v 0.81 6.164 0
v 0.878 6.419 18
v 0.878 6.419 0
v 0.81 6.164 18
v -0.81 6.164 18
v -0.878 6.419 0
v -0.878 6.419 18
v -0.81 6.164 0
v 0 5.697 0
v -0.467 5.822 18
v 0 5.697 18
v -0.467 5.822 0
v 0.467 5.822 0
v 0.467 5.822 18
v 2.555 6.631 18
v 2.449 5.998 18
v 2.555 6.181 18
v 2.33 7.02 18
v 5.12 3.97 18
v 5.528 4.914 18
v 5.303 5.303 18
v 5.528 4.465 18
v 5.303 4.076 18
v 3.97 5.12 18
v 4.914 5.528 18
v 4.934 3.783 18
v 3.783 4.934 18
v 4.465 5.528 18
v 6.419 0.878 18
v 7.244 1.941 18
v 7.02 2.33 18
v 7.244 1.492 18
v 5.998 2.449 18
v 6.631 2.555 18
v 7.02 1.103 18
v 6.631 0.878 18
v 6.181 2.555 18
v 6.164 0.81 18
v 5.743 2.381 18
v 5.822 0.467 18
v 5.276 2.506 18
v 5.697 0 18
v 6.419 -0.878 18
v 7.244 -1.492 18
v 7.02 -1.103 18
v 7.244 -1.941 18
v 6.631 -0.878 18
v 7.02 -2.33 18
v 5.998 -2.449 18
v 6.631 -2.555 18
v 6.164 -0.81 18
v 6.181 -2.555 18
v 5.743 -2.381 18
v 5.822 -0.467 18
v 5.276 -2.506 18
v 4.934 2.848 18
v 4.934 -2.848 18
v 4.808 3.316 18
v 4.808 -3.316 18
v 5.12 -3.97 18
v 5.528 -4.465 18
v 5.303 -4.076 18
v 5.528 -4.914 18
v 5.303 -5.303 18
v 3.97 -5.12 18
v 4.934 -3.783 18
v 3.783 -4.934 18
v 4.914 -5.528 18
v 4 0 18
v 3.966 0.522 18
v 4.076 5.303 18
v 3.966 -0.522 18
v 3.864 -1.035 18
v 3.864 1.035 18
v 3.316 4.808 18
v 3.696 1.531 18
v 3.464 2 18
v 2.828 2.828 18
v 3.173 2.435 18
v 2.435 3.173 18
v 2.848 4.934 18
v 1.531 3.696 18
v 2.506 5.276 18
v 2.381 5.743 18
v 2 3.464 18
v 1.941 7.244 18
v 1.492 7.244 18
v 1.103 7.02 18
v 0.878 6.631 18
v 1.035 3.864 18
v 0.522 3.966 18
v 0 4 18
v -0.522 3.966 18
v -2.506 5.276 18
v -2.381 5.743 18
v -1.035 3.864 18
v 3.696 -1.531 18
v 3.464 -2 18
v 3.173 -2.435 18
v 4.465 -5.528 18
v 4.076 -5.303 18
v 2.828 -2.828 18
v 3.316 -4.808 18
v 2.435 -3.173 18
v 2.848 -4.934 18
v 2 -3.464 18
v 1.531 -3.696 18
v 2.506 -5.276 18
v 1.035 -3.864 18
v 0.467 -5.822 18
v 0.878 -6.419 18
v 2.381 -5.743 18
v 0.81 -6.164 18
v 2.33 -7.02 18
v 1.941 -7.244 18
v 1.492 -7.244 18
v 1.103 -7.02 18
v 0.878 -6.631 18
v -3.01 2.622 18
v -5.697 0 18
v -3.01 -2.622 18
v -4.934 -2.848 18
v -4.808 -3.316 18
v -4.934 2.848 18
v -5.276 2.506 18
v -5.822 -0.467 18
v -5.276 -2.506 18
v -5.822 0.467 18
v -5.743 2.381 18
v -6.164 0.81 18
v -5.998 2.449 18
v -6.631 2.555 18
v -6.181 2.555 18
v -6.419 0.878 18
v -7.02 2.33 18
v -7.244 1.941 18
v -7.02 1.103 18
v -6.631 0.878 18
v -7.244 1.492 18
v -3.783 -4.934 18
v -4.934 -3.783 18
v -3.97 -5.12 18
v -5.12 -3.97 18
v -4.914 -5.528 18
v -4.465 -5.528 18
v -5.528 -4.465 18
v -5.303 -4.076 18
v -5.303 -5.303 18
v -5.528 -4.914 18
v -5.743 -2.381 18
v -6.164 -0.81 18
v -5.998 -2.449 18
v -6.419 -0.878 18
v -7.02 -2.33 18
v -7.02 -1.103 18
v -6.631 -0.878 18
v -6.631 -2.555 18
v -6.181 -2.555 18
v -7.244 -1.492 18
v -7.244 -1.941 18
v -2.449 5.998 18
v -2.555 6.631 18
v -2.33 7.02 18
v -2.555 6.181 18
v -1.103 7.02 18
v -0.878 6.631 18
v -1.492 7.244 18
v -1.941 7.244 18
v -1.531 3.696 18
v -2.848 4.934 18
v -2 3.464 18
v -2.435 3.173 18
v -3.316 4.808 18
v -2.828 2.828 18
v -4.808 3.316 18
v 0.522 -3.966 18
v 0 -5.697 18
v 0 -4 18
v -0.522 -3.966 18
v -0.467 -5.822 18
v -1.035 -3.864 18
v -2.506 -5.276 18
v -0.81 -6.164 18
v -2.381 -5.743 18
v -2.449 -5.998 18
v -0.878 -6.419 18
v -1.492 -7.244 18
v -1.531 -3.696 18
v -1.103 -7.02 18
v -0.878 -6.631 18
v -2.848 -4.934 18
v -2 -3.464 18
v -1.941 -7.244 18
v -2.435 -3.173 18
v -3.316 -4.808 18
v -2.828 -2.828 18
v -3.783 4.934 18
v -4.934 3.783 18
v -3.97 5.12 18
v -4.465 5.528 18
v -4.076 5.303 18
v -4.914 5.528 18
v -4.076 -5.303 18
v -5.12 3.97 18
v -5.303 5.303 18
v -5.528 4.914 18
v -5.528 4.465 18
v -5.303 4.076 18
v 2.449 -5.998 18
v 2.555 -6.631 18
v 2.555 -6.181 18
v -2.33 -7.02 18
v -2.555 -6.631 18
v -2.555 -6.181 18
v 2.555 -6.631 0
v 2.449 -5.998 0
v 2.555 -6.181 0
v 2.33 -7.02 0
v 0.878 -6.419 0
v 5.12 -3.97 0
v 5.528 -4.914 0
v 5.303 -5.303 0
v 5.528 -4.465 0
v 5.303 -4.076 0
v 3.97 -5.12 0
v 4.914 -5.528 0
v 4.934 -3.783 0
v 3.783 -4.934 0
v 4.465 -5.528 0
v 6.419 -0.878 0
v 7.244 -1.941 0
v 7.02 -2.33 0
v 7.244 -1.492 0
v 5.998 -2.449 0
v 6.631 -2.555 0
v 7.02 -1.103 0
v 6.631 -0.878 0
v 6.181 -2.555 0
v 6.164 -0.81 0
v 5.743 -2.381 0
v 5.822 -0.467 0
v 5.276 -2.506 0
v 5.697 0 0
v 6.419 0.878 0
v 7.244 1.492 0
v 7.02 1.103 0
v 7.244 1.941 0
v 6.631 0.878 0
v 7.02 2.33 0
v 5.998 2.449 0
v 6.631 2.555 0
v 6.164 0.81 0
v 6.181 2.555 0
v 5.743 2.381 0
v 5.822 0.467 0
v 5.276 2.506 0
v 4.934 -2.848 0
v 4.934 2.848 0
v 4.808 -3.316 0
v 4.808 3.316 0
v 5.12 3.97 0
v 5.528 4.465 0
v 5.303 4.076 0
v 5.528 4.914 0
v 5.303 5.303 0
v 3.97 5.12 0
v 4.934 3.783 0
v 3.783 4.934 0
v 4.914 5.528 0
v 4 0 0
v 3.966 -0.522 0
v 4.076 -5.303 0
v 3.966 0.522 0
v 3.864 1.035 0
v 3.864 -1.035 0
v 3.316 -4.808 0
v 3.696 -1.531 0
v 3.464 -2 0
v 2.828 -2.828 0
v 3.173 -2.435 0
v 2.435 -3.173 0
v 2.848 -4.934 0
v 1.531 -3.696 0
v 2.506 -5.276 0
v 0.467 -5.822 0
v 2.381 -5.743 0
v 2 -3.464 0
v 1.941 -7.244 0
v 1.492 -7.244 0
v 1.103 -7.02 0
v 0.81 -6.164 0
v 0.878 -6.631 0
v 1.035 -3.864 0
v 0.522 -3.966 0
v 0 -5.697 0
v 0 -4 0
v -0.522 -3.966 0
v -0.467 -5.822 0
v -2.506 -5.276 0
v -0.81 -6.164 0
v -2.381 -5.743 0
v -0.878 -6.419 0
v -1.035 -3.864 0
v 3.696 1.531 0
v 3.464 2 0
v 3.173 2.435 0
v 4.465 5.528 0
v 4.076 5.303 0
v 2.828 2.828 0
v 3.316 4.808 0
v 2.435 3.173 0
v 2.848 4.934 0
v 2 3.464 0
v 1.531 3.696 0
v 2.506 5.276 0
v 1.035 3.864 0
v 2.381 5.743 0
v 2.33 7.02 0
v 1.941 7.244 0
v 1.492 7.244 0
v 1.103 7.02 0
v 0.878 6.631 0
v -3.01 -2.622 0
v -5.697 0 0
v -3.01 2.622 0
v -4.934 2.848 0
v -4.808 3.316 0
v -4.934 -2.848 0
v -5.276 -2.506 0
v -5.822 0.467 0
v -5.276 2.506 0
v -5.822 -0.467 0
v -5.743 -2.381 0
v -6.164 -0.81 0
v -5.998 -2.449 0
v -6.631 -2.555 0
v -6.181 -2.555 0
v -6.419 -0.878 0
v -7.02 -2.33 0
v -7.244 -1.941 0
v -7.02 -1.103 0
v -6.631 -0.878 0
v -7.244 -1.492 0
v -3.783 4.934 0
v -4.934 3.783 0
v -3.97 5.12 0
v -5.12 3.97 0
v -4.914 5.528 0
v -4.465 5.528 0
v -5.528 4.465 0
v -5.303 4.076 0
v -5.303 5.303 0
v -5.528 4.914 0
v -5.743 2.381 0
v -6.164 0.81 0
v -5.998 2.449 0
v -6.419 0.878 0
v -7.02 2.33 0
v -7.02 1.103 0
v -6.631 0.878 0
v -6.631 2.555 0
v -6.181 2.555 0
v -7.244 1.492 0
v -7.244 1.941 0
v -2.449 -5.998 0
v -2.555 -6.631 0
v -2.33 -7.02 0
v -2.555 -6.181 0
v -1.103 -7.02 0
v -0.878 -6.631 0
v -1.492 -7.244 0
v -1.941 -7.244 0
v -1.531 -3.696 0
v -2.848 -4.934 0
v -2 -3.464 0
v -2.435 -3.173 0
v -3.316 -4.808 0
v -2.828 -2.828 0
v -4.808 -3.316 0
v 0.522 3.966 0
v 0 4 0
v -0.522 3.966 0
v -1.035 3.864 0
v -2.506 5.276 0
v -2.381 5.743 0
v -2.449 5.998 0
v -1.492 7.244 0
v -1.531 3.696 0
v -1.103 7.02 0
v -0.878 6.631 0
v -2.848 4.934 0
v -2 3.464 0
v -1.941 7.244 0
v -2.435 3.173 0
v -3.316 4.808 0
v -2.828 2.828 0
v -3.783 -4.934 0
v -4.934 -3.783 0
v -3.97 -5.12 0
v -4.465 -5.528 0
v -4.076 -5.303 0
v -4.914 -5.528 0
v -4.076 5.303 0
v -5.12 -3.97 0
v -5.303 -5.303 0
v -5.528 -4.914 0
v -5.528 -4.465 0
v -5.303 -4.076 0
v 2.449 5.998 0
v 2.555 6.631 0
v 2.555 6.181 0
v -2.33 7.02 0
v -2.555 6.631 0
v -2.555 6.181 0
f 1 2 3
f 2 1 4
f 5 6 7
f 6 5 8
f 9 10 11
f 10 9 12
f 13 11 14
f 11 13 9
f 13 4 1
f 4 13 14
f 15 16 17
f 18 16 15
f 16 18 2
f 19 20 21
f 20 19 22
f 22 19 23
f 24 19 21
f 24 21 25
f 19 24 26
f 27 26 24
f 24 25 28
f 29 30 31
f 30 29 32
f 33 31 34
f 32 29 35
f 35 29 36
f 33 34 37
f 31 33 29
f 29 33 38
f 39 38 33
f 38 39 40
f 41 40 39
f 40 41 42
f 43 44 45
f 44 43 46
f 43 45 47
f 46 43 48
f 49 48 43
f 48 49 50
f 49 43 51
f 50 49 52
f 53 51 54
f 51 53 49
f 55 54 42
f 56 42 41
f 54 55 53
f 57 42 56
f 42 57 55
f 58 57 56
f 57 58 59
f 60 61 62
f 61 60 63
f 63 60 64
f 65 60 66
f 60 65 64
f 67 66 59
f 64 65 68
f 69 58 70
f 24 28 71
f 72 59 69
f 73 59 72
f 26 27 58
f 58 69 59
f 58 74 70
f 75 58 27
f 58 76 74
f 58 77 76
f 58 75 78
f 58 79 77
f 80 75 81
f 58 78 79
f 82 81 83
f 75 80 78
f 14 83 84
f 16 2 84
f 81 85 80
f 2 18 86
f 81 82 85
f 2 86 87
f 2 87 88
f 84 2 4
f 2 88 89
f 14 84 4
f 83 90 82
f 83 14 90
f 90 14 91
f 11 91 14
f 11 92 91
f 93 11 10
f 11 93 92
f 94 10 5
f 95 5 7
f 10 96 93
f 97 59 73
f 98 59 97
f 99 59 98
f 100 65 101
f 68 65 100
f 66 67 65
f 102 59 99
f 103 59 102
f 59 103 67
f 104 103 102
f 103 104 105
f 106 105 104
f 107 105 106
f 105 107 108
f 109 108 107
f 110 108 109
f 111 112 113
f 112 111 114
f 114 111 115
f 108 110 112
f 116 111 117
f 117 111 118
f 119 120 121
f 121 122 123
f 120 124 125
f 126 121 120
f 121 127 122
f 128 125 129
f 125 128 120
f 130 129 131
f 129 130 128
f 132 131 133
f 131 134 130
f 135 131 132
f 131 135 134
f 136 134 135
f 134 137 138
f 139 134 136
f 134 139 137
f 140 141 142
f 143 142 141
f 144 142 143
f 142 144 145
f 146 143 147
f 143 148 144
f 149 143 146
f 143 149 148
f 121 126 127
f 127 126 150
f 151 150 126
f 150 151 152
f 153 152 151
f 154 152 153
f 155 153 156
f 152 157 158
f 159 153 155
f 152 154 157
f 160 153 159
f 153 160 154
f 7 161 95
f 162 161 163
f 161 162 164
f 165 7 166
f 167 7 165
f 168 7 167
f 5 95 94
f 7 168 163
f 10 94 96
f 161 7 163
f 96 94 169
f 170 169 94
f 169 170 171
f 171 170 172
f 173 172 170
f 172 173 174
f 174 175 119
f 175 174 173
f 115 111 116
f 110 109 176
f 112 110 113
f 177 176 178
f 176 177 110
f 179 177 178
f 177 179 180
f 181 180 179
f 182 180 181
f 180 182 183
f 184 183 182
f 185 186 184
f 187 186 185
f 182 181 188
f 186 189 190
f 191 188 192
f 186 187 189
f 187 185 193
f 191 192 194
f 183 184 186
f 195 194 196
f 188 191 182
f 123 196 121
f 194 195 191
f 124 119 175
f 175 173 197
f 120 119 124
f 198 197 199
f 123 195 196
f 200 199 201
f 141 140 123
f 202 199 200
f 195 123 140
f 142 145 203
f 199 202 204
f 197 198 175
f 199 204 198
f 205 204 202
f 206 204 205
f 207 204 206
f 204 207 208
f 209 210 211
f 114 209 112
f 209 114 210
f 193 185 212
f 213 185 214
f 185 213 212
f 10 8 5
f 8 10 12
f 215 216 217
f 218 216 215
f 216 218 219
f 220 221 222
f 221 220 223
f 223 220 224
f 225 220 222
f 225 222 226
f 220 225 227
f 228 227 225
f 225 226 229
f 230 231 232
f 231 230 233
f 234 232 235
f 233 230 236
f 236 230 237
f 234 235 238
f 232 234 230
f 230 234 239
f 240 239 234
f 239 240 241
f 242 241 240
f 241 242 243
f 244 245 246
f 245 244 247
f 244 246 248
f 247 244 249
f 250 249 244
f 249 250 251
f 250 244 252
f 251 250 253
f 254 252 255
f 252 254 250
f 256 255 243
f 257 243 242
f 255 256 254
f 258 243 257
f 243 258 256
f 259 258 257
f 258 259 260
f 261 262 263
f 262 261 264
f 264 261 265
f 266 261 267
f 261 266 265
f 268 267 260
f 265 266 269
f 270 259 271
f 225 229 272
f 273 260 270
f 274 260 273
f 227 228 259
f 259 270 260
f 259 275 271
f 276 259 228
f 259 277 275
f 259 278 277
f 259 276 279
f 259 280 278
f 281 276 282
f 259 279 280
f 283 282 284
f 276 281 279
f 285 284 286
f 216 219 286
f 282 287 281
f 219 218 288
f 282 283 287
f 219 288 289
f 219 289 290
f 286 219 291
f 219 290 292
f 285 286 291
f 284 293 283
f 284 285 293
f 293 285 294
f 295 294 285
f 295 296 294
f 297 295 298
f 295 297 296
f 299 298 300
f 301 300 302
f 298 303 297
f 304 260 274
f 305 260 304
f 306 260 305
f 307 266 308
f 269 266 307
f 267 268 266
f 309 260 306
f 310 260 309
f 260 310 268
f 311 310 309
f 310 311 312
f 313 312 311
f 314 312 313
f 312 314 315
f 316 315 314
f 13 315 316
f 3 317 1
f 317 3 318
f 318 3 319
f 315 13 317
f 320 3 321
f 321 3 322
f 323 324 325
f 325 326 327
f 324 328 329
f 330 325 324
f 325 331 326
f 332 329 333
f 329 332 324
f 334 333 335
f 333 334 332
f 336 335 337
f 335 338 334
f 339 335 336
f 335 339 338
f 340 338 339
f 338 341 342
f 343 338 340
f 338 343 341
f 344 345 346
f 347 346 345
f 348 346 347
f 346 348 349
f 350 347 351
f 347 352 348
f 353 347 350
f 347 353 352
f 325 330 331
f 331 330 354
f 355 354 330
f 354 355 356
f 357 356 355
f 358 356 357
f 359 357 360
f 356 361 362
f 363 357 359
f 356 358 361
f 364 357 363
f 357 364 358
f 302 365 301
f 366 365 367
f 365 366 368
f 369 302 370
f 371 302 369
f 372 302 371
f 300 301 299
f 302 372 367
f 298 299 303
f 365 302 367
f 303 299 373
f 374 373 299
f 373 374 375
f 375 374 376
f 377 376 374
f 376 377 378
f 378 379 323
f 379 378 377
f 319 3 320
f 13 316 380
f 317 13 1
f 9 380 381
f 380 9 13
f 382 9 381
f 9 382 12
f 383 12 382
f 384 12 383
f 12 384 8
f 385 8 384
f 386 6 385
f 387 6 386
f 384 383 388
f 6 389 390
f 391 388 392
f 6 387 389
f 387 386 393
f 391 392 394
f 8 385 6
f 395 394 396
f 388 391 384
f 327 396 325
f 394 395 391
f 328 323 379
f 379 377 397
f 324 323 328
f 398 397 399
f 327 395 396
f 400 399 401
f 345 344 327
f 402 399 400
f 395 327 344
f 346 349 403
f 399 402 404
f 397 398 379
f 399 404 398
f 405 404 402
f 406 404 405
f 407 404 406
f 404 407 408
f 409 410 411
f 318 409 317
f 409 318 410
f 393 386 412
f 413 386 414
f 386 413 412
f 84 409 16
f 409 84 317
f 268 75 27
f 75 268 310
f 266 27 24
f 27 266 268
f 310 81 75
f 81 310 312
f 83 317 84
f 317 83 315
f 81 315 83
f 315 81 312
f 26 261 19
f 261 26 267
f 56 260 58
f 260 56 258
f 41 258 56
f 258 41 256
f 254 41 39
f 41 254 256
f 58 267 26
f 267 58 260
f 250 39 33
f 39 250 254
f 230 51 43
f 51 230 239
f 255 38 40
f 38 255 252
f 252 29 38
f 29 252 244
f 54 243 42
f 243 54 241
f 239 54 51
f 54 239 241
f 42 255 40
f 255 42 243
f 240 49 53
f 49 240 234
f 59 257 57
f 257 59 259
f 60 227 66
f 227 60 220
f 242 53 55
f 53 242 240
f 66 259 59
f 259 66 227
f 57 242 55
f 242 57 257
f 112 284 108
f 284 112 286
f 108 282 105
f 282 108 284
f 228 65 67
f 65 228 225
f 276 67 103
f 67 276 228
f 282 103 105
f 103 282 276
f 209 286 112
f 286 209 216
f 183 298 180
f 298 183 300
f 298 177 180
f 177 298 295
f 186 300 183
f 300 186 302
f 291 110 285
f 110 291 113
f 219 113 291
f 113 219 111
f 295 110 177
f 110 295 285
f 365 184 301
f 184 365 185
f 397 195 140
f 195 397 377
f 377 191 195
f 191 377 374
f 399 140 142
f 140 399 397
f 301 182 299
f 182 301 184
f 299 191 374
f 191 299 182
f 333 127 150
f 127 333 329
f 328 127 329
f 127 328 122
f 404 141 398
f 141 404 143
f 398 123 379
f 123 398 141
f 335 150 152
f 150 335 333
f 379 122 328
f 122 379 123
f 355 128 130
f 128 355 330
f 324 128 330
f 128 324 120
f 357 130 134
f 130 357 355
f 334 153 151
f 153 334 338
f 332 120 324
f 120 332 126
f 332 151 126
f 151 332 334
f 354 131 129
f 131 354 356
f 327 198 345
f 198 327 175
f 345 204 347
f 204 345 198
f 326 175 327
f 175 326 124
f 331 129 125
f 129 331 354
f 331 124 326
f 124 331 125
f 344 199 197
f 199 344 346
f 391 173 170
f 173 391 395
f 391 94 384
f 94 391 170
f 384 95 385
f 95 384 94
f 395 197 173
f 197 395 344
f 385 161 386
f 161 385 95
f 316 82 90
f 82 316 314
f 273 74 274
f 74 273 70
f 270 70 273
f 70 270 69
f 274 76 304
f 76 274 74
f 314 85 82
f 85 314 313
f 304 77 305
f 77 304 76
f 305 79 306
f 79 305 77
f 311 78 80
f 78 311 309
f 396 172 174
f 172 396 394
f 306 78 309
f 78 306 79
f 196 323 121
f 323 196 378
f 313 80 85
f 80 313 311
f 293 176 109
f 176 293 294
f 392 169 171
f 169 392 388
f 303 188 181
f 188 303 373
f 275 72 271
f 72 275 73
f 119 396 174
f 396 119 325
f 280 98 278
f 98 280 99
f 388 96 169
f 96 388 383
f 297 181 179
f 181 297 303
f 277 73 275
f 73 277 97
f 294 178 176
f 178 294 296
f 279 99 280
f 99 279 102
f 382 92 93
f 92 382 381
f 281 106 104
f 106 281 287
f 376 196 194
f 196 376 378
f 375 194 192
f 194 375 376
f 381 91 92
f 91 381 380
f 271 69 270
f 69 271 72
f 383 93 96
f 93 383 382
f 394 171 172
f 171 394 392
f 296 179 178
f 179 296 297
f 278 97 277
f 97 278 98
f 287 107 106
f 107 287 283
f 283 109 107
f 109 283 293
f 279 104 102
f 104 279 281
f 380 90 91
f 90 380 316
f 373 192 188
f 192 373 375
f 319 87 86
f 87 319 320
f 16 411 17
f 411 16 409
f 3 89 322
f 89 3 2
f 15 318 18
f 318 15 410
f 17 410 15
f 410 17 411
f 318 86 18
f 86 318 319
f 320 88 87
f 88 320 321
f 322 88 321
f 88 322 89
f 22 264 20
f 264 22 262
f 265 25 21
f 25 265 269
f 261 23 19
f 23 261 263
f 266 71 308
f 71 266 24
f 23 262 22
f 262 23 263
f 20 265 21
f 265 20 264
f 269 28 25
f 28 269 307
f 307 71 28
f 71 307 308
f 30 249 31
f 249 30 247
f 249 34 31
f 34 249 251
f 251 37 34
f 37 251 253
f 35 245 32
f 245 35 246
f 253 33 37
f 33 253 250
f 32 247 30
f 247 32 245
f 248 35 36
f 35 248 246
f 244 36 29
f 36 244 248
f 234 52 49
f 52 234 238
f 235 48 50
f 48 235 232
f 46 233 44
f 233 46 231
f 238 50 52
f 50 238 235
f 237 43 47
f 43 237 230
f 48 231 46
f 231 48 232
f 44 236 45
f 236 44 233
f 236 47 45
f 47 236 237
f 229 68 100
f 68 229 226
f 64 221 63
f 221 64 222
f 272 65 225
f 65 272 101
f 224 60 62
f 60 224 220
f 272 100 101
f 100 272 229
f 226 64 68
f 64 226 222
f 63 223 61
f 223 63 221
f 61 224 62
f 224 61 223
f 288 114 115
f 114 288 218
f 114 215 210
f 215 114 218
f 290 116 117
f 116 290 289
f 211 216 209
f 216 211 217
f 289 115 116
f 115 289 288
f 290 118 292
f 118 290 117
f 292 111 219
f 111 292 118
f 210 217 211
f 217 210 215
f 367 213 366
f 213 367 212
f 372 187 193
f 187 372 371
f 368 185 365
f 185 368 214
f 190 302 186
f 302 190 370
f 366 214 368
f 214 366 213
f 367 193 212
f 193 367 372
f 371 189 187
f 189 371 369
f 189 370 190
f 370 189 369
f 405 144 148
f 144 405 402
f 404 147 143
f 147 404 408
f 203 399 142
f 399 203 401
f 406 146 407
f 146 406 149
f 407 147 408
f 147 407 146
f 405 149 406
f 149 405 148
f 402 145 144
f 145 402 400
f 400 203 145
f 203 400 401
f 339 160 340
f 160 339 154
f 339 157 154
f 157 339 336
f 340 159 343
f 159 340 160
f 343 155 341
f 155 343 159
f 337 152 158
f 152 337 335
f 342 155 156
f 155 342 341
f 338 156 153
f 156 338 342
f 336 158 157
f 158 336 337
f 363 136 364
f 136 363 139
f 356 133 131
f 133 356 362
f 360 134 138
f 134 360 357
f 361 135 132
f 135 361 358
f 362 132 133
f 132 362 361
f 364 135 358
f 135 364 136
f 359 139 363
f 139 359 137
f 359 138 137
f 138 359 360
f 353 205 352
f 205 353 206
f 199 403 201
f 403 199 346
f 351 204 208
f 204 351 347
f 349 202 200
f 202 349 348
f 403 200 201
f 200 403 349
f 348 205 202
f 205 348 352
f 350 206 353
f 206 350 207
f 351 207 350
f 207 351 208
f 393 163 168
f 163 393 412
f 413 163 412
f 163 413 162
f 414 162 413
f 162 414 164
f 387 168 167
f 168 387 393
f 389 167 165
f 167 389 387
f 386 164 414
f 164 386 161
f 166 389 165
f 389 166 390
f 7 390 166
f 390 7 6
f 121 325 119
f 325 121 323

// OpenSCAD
// Takuya Yamaguchi

// ignore variable values
//$fn=48;

//custermizing data

// number of tooth
nt =12;

//shaft diameter		
sd =8;

//gear diameter		
gd=15;

// fringe thickness		
ggdt=1.5;	

// gear hight
gh=18;

//number of fringe		
nf=0;	//[0,1,2]

//tooth shape	
$fn=12; //[4,5,6,7,8,12]

//Dcut yes or no
Dcut="yes";//[yes,no]

// ignore variable values
gpr=gd*3.14159/4/nt/(1+3.141592/nt/2);	//gear tooth r
gmr=gpr*1.077; 							// gear gap r
ggd=gd+4; 									// fringe diameter
dh=gh; 										//Dcut hight
off= 360/nt/2;  							// tooth offset

module pgear()

	union(){
	translate([0, 0, 0]) {
		difference() {
         union(){  //gear & fringe
		  translate([0, 0, 0]) cylinder(h = gh, r =gd/2-gpr,$fn=48); //gear
      if (nf == 1){
          translate([0, 0, gh-ggdt])cylinder(h = ggdt, r= ggd/2,$fn=96); //fringe
      				}
      if (nf == 2){
         translate([0, 0, gh-ggdt])cylinder(h = ggdt, r= ggd/2,$fn=96); //fringe
         translate([0, 0, 0])cylinder(h = ggdt, r= ggd/2,$fn=96); //fringe
                   }
                 }
translate([0, 0, -0.5])  // shaft 
			cylinder(h = gh+2.5, r= sd/2,$fn=48);

		for (i = [0:(nt-1)]) { 		//gear gap
			echo(360*i/nt, sin(360*i/nt)*(gd/2-gpr), cos(360*i/nt)*(gd/2-gpr));
			translate([sin(360*i/nt)*(gd/2-gpr), cos(360*i/nt)*(gd/2-gpr), ggdt*nf*(nf-1)*0.5])
				rotate([0,0,90*(1-2/$fn)-360*i/nt-($fn-1)*off]) cylinder(h = gh-ggdt*nf, r=gmr);
		                      }
     							}
		for (i = [0:(nt-1)]) {  // Gear tooth
			echo(360*i/nt+off, sin(360*i/nt+off)*(gd/2-gpr), cos(360*i/nt+off)*(gd/2-gpr));
			translate([sin(360*i/nt+off)*(gd/2-gpr), cos(360*i/nt+off)*(gd/2-gpr), 0 ])
				rotate([0,0,90*(1-2/$fn)-360*i/nt-$fn*off]) cylinder(h = gh, r=gpr);
		                      }
                }


 			
	 // Dcut
 if (Dcut== "yes"){
         translate([-(sd/2.1), 0, gh/2]) cube([sd/5,sd*0.8,dh], center = true); // Dcut
       }
}

pgear();
